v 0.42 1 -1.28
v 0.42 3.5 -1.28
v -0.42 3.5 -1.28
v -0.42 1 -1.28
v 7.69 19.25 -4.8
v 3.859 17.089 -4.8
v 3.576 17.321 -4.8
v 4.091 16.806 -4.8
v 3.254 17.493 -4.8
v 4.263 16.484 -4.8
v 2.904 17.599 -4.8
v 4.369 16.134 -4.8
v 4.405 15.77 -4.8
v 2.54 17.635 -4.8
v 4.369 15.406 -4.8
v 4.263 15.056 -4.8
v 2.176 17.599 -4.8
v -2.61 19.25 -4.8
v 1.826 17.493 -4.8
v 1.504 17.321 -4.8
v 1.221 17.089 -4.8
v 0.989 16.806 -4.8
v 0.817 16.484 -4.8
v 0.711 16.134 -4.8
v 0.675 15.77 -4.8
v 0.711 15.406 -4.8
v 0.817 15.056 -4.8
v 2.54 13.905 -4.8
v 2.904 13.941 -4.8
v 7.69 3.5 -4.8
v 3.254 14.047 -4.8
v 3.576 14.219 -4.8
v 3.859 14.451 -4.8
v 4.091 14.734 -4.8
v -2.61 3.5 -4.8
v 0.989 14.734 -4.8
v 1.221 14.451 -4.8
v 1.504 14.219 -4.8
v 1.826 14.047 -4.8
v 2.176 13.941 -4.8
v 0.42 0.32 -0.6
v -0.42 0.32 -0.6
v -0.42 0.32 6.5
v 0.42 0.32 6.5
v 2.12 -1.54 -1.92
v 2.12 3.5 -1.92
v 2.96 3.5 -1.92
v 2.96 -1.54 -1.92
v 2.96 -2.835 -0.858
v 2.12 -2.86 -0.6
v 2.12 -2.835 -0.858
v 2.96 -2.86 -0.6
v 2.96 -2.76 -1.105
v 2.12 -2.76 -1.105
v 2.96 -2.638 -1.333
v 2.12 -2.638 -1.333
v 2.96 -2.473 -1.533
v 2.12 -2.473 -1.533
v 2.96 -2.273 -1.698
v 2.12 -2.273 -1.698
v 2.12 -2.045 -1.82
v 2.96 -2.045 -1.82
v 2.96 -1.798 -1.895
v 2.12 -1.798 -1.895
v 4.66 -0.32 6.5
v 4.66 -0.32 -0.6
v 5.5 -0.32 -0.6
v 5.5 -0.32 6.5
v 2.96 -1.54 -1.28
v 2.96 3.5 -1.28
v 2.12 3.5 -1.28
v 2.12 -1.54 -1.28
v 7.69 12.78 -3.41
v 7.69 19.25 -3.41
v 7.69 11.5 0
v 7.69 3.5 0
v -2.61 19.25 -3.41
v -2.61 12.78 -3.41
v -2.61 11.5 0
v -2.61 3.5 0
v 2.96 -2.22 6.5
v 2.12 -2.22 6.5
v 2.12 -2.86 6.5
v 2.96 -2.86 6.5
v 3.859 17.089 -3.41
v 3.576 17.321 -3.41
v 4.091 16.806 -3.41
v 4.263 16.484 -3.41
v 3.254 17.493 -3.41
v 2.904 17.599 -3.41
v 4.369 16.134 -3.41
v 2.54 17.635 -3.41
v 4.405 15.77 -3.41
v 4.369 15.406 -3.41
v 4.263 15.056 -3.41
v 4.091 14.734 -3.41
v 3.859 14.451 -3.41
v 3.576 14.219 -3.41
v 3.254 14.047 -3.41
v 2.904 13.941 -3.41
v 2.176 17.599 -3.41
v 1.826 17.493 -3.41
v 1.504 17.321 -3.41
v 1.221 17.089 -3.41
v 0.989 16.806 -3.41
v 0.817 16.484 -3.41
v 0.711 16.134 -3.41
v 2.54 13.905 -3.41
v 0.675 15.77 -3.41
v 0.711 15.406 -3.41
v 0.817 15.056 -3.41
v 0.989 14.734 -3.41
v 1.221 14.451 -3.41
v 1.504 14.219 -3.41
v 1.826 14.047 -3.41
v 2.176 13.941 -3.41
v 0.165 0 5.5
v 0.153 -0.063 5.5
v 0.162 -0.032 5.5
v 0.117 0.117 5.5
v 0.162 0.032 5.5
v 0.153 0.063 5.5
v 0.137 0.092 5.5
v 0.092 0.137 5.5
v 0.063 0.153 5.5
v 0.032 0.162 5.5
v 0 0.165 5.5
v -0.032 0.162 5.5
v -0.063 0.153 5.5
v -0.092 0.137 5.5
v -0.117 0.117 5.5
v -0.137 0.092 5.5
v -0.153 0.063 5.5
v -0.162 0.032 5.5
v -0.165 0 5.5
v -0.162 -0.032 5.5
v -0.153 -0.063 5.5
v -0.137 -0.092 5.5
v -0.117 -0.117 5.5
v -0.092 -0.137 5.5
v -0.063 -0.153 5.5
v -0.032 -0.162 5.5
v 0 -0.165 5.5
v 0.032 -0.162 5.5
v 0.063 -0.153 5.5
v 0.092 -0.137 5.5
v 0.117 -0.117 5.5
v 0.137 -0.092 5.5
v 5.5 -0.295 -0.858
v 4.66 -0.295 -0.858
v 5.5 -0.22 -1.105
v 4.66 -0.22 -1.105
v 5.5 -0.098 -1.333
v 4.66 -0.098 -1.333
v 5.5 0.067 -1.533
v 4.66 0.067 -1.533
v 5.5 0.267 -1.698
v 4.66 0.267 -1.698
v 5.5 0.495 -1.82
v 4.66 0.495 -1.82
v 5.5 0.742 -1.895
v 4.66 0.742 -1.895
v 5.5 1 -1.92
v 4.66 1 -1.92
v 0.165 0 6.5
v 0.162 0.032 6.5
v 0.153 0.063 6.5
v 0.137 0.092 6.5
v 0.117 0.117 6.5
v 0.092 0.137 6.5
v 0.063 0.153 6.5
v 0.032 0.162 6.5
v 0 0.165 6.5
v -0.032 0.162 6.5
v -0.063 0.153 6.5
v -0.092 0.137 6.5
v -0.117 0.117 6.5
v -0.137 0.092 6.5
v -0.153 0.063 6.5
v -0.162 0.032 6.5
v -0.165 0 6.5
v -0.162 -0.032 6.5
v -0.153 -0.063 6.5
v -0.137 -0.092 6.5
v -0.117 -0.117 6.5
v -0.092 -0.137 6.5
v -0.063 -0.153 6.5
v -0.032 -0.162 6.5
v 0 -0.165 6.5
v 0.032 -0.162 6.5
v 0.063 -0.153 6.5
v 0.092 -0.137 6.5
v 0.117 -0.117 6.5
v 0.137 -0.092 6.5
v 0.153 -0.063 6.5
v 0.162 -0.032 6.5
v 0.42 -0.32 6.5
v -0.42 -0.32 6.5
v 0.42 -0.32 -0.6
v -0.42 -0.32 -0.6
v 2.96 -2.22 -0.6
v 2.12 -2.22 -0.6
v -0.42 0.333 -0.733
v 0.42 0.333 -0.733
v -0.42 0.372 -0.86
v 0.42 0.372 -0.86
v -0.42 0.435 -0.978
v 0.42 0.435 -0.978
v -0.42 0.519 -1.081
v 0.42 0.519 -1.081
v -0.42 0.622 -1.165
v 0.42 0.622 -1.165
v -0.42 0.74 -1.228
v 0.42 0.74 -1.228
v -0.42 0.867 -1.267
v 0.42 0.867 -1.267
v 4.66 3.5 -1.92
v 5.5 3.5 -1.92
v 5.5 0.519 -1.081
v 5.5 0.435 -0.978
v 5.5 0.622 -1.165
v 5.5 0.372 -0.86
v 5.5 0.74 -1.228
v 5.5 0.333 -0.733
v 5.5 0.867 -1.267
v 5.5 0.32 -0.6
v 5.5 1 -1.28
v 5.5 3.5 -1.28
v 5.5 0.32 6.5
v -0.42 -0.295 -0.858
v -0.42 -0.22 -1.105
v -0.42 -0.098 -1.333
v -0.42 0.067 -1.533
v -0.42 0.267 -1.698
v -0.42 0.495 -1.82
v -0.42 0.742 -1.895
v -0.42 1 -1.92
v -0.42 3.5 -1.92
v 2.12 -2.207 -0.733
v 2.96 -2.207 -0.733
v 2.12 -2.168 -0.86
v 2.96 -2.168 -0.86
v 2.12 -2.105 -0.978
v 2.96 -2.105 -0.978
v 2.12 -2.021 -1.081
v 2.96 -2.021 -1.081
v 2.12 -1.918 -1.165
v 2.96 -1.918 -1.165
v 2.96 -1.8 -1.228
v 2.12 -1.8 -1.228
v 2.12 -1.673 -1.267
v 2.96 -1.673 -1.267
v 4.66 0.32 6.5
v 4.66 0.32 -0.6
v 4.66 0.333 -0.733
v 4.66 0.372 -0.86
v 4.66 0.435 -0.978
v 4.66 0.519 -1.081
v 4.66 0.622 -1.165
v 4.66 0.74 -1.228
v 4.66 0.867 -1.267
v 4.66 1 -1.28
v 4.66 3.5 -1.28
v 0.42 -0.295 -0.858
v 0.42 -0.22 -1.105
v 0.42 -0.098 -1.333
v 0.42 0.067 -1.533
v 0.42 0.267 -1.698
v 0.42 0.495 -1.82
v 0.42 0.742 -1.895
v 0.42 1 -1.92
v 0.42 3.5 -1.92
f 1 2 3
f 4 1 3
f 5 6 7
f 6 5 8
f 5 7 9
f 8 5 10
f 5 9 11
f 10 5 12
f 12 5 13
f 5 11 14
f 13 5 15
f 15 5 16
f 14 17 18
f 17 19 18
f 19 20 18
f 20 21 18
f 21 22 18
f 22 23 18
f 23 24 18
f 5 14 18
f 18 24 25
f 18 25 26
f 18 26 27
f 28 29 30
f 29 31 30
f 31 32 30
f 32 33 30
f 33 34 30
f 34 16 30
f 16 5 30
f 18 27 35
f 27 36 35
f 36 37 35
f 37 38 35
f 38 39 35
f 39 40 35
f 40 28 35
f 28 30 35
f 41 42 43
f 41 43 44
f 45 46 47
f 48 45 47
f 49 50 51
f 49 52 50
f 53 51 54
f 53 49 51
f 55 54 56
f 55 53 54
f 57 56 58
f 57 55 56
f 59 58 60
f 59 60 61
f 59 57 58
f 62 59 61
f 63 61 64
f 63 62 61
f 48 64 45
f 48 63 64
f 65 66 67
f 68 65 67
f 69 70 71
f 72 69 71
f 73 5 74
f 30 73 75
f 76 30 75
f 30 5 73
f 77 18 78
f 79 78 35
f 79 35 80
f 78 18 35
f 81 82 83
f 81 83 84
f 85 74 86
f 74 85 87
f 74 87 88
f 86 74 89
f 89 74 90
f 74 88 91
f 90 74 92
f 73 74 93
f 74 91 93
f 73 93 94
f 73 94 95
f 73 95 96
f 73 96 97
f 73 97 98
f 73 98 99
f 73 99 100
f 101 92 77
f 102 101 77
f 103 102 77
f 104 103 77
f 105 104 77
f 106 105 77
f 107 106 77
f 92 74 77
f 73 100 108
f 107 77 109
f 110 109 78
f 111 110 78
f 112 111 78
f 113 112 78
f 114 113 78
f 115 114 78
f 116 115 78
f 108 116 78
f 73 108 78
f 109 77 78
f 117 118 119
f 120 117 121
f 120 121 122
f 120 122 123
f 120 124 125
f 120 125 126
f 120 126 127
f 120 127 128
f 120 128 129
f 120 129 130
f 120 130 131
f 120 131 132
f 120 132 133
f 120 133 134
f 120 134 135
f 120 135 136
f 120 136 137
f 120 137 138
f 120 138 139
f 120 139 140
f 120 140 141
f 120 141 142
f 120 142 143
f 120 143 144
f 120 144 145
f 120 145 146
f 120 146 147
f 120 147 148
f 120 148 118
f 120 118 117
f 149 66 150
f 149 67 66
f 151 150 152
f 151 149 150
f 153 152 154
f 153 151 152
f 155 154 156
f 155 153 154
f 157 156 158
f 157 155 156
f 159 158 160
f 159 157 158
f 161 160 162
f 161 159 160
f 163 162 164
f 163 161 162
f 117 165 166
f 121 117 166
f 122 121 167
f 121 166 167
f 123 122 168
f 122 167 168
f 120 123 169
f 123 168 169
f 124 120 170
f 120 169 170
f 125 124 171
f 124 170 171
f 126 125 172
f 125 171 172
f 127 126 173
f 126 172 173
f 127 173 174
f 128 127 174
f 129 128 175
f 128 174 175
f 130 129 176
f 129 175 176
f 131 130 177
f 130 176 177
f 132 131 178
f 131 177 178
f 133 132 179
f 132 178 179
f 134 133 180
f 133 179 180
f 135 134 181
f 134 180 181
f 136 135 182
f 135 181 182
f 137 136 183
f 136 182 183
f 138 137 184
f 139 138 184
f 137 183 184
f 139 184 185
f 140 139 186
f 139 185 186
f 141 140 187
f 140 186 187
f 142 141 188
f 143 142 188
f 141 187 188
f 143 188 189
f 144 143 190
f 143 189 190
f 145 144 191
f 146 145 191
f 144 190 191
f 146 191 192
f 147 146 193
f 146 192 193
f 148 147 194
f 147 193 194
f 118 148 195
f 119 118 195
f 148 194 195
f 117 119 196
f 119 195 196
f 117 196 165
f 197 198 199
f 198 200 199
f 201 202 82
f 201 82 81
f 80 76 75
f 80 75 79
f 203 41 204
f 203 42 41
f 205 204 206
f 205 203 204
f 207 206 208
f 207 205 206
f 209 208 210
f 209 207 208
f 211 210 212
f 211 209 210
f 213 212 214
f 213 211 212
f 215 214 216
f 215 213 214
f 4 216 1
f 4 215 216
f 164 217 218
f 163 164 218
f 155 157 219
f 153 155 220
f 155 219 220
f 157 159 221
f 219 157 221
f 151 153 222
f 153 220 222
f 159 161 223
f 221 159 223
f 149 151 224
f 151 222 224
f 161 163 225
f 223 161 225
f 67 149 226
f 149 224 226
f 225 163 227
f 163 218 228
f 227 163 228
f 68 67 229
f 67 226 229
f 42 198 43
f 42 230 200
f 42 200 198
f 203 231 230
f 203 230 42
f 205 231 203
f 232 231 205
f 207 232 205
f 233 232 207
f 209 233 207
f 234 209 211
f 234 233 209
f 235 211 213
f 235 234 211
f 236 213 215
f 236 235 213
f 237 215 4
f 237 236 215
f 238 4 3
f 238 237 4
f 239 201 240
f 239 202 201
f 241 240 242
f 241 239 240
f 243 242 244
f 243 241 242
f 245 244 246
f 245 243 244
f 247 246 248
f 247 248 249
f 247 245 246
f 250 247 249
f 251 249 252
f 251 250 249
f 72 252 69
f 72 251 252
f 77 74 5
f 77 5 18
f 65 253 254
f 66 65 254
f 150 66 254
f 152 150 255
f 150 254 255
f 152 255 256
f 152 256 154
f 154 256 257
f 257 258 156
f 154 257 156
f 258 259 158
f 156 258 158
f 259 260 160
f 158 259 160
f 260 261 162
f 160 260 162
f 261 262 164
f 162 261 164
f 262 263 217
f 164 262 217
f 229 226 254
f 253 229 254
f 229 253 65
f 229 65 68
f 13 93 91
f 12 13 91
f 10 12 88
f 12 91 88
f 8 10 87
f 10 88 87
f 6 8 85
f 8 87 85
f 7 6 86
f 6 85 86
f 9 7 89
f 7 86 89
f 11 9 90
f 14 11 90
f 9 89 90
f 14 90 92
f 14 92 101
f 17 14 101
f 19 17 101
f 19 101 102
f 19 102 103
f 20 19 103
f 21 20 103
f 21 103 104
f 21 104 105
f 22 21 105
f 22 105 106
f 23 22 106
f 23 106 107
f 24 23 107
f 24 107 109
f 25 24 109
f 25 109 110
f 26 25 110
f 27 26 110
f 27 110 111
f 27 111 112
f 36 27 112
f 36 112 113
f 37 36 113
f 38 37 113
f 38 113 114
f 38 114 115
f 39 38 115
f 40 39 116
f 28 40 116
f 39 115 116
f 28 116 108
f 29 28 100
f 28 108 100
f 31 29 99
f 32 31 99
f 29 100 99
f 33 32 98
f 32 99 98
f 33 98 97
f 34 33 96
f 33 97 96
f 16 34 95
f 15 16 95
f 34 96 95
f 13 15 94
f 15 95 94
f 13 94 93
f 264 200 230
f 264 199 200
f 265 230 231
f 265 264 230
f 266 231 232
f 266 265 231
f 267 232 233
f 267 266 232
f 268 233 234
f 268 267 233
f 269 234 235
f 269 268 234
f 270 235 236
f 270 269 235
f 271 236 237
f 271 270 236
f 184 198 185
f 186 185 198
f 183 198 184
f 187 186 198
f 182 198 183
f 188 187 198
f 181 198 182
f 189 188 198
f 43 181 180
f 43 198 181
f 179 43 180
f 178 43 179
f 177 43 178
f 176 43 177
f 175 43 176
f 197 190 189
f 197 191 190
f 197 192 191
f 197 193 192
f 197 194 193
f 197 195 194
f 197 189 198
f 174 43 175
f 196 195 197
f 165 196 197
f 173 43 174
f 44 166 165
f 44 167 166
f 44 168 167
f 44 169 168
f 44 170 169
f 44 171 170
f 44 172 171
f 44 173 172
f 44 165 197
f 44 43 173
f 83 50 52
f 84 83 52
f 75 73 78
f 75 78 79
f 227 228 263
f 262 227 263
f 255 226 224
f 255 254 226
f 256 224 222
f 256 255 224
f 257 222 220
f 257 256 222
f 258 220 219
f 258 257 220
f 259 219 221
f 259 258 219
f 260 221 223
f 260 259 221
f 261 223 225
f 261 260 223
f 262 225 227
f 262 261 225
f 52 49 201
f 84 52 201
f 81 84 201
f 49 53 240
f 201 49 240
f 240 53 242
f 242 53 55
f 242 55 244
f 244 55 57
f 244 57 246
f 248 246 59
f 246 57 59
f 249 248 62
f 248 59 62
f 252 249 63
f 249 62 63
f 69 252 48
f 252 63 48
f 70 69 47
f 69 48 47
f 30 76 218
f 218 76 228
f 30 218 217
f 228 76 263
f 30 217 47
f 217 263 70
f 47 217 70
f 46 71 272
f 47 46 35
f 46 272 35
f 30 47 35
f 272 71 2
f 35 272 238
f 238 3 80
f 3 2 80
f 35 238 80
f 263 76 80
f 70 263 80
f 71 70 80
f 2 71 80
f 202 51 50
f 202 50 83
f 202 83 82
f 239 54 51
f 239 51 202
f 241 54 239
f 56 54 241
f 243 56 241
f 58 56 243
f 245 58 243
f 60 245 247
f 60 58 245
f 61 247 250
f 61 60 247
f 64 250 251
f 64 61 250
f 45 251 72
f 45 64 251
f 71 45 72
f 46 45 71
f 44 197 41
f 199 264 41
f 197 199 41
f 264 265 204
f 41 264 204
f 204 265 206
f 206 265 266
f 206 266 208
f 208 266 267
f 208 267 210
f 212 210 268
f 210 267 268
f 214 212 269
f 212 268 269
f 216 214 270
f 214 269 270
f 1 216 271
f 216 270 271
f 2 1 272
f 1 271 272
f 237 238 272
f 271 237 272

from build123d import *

# Parameters (mm, degrees)
SKETCH_5_W                      = 10.3
SKETCH_5_H                      = 4.8
EXTRUDE_1_DEPTH                 = 15.75
CUT_EXTRUDE_1_REACH             = 23.278
CUT_EXTRUDE_1_DIRECTION_2_REACH = 23.278
SKETCH_11_R                     = 1.865
CUT_EXTRUDE_2_DEPTH             = 4.8
SKETCH_3_W                      = 0.84
SKETCH_3_H                      = 0.64
SKETCH_4_W                      = 0.84
SKETCH_4_H                      = 0.64
SKETCH_3_3_W                    = 0.84
SKETCH_3_3_H                    = 0.64
EXTRUDE_2_DEPTH                 = 2.5
SKETCH_4_3_W                    = 0.84
SKETCH_4_3_H                    = 0.64
EXTRUDE_3_DEPTH                 = 2.5
SKETCH_12_W                     = 0.84
SKETCH_12_H                     = 0.64
EXTRUDE_4_DEPTH                 = 4
SKETCH_13_R                     = 0.16516852
CUT_EXTRUDE_3_DEPTH             = 1


with BuildPart() as part:
    # Эскиз5 → Вытянуть1 (new body)
    with BuildSketch(Plane(origin=(0, 3.5, 0), x_dir=(-1, 0, 0), z_dir=(0, 1, 0))):
        with Locations((-2.54, -2.4)):
            Rectangle(SKETCH_5_W, SKETCH_5_H)
    extrude(amount=EXTRUDE_1_DEPTH)

    # Вырез-Вытянуть1: up to this face of the body (flat: up to its plane)
    cut_extrude_1_end = Plane(part.part.faces().sort_by_distance((-2.61, 11.375, -2.4))[0])
    # Эскиз10 → Вырез-Вытянуть1 (cut, up to the picked face)
    with BuildSketch(Plane(origin=(0, 0, 0), x_dir=(0, 0, -1), z_dir=(1, 0, 0)), mode=Mode.PRIVATE) as cut_extrude_1_sk1:
        Polygon((0, 19.25), (3.41, 19.25), (3.41, 12.78), (0, 11.5), align=None)
    cut_extrude_1_tool1 = split(extrude(cut_extrude_1_sk1.sketch, amount=-CUT_EXTRUDE_1_REACH, mode=Mode.PRIVATE), bisect_by=cut_extrude_1_end, keep=Keep.BOTH, mode=Mode.PRIVATE)
    add(cut_extrude_1_tool1.solids().sort_by(Axis((0, 15.685398, -1.653842), (-1, 0, 0)))[0], mode=Mode.SUBTRACT)

    # Вырез-Вытянуть1 direction 2: up to this face of the body (flat: up to its plane)
    cut_extrude_1_direction_2_end = Plane(part.part.faces().sort_by_distance((7.69, 11.375, -2.4))[0])
    # Эскиз10 → Вырез-Вытянуть1 direction 2 (cut, up to the picked face)
    with BuildSketch(Plane(origin=(0, 0, 0), x_dir=(0, 0, -1), z_dir=(1, 0, 0)), mode=Mode.PRIVATE) as cut_extrude_1_direction_2_sk1:
        Polygon((0, 19.25), (3.41, 19.25), (3.41, 12.78), (0, 11.5), align=None)
    cut_extrude_1_direction_2_tool1 = split(extrude(cut_extrude_1_direction_2_sk1.sketch, amount=CUT_EXTRUDE_1_DIRECTION_2_REACH, mode=Mode.PRIVATE), bisect_by=cut_extrude_1_direction_2_end, keep=Keep.BOTH, mode=Mode.PRIVATE)
    add(cut_extrude_1_direction_2_tool1.solids().sort_by(Axis((0, 15.685398, -1.653842), (1, 0, 0)))[0], mode=Mode.SUBTRACT)

    # Эскиз11 → Вырез-Вытянуть2 (cut)
    with BuildSketch(Plane.XY):
        with Locations((2.54, 15.77)):
            Circle(SKETCH_11_R)
    extrude(amount=-CUT_EXTRUDE_2_DEPTH, mode=Mode.SUBTRACT)

    # По траектории1: sweep along a path in Эскиз8
    with BuildLine(Plane(origin=(0, 0, 0), x_dir=(0, 0, -1), z_dir=(1, 0, 0))) as sweep_1_path:
        Line((0, 0), (0.6, 0))
        ThreePointArc((0.6, 0), (1.307106781, 0.292893219), (1.6, 1))
        Line((1.6, 1), (1.6, 3.5))
    # Эскиз3 → По траектории1 (sweep)
    with BuildSketch(Plane.XY):
        Rectangle(SKETCH_3_W, SKETCH_3_H)
        with Locations((5.08, 0)):
            Rectangle(SKETCH_3_W, SKETCH_3_H)
    sweep(path=sweep_1_path.line)

    # По траектории2: sweep along a path in Эскиз9
    with BuildLine(Plane(origin=(0, 0, 0), x_dir=(0, 0, -1), z_dir=(1, 0, 0))) as sweep_2_path:
        Line((0, -2.54), (0.6, -2.54))
        ThreePointArc((0.6, -2.54), (1.307106781, -2.247106781), (1.6, -1.54))
        Line((1.6, -1.54), (1.6, 4.77))
    # Эскиз4 → По траектории2 (sweep)
    with BuildSketch(Plane.XY):
        with Locations((2.54, -2.54)):
            Rectangle(SKETCH_4_W, SKETCH_4_H)
    sweep(path=sweep_2_path.line)

    # Эскиз3<3> → Вытянуть2 (add)
    with BuildSketch(Plane.XY):
        Rectangle(SKETCH_3_3_W, SKETCH_3_3_H)
        with Locations((5.08, 0)):
            Rectangle(SKETCH_3_3_W, SKETCH_3_3_H)
    extrude(amount=EXTRUDE_2_DEPTH)

    # Эскиз4<3> → Вытянуть3 (add)
    with BuildSketch(Plane.XY):
        with Locations((2.54, -2.54)):
            Rectangle(SKETCH_4_3_W, SKETCH_4_3_H)
    extrude(amount=EXTRUDE_3_DEPTH)

    # Эскиз12 → Вытянуть4 (add)
    with BuildSketch(Plane.XY.offset(2.5)):
        Rectangle(SKETCH_12_W, SKETCH_12_H)
        with Locations((5.08, 0)):
            Rectangle(SKETCH_12_W, SKETCH_12_H)
        with Locations((2.54, -2.54)):
            Rectangle(SKETCH_12_W, SKETCH_12_H)
    extrude(amount=EXTRUDE_4_DEPTH)

    # Эскиз13 → Вырез-Вытянуть3 (cut)
    with BuildSketch(Plane.XY.offset(6.5)):
        Circle(SKETCH_13_R)
    extrude(amount=-CUT_EXTRUDE_3_DEPTH, mode=Mode.SUBTRACT)


solid = part.part
